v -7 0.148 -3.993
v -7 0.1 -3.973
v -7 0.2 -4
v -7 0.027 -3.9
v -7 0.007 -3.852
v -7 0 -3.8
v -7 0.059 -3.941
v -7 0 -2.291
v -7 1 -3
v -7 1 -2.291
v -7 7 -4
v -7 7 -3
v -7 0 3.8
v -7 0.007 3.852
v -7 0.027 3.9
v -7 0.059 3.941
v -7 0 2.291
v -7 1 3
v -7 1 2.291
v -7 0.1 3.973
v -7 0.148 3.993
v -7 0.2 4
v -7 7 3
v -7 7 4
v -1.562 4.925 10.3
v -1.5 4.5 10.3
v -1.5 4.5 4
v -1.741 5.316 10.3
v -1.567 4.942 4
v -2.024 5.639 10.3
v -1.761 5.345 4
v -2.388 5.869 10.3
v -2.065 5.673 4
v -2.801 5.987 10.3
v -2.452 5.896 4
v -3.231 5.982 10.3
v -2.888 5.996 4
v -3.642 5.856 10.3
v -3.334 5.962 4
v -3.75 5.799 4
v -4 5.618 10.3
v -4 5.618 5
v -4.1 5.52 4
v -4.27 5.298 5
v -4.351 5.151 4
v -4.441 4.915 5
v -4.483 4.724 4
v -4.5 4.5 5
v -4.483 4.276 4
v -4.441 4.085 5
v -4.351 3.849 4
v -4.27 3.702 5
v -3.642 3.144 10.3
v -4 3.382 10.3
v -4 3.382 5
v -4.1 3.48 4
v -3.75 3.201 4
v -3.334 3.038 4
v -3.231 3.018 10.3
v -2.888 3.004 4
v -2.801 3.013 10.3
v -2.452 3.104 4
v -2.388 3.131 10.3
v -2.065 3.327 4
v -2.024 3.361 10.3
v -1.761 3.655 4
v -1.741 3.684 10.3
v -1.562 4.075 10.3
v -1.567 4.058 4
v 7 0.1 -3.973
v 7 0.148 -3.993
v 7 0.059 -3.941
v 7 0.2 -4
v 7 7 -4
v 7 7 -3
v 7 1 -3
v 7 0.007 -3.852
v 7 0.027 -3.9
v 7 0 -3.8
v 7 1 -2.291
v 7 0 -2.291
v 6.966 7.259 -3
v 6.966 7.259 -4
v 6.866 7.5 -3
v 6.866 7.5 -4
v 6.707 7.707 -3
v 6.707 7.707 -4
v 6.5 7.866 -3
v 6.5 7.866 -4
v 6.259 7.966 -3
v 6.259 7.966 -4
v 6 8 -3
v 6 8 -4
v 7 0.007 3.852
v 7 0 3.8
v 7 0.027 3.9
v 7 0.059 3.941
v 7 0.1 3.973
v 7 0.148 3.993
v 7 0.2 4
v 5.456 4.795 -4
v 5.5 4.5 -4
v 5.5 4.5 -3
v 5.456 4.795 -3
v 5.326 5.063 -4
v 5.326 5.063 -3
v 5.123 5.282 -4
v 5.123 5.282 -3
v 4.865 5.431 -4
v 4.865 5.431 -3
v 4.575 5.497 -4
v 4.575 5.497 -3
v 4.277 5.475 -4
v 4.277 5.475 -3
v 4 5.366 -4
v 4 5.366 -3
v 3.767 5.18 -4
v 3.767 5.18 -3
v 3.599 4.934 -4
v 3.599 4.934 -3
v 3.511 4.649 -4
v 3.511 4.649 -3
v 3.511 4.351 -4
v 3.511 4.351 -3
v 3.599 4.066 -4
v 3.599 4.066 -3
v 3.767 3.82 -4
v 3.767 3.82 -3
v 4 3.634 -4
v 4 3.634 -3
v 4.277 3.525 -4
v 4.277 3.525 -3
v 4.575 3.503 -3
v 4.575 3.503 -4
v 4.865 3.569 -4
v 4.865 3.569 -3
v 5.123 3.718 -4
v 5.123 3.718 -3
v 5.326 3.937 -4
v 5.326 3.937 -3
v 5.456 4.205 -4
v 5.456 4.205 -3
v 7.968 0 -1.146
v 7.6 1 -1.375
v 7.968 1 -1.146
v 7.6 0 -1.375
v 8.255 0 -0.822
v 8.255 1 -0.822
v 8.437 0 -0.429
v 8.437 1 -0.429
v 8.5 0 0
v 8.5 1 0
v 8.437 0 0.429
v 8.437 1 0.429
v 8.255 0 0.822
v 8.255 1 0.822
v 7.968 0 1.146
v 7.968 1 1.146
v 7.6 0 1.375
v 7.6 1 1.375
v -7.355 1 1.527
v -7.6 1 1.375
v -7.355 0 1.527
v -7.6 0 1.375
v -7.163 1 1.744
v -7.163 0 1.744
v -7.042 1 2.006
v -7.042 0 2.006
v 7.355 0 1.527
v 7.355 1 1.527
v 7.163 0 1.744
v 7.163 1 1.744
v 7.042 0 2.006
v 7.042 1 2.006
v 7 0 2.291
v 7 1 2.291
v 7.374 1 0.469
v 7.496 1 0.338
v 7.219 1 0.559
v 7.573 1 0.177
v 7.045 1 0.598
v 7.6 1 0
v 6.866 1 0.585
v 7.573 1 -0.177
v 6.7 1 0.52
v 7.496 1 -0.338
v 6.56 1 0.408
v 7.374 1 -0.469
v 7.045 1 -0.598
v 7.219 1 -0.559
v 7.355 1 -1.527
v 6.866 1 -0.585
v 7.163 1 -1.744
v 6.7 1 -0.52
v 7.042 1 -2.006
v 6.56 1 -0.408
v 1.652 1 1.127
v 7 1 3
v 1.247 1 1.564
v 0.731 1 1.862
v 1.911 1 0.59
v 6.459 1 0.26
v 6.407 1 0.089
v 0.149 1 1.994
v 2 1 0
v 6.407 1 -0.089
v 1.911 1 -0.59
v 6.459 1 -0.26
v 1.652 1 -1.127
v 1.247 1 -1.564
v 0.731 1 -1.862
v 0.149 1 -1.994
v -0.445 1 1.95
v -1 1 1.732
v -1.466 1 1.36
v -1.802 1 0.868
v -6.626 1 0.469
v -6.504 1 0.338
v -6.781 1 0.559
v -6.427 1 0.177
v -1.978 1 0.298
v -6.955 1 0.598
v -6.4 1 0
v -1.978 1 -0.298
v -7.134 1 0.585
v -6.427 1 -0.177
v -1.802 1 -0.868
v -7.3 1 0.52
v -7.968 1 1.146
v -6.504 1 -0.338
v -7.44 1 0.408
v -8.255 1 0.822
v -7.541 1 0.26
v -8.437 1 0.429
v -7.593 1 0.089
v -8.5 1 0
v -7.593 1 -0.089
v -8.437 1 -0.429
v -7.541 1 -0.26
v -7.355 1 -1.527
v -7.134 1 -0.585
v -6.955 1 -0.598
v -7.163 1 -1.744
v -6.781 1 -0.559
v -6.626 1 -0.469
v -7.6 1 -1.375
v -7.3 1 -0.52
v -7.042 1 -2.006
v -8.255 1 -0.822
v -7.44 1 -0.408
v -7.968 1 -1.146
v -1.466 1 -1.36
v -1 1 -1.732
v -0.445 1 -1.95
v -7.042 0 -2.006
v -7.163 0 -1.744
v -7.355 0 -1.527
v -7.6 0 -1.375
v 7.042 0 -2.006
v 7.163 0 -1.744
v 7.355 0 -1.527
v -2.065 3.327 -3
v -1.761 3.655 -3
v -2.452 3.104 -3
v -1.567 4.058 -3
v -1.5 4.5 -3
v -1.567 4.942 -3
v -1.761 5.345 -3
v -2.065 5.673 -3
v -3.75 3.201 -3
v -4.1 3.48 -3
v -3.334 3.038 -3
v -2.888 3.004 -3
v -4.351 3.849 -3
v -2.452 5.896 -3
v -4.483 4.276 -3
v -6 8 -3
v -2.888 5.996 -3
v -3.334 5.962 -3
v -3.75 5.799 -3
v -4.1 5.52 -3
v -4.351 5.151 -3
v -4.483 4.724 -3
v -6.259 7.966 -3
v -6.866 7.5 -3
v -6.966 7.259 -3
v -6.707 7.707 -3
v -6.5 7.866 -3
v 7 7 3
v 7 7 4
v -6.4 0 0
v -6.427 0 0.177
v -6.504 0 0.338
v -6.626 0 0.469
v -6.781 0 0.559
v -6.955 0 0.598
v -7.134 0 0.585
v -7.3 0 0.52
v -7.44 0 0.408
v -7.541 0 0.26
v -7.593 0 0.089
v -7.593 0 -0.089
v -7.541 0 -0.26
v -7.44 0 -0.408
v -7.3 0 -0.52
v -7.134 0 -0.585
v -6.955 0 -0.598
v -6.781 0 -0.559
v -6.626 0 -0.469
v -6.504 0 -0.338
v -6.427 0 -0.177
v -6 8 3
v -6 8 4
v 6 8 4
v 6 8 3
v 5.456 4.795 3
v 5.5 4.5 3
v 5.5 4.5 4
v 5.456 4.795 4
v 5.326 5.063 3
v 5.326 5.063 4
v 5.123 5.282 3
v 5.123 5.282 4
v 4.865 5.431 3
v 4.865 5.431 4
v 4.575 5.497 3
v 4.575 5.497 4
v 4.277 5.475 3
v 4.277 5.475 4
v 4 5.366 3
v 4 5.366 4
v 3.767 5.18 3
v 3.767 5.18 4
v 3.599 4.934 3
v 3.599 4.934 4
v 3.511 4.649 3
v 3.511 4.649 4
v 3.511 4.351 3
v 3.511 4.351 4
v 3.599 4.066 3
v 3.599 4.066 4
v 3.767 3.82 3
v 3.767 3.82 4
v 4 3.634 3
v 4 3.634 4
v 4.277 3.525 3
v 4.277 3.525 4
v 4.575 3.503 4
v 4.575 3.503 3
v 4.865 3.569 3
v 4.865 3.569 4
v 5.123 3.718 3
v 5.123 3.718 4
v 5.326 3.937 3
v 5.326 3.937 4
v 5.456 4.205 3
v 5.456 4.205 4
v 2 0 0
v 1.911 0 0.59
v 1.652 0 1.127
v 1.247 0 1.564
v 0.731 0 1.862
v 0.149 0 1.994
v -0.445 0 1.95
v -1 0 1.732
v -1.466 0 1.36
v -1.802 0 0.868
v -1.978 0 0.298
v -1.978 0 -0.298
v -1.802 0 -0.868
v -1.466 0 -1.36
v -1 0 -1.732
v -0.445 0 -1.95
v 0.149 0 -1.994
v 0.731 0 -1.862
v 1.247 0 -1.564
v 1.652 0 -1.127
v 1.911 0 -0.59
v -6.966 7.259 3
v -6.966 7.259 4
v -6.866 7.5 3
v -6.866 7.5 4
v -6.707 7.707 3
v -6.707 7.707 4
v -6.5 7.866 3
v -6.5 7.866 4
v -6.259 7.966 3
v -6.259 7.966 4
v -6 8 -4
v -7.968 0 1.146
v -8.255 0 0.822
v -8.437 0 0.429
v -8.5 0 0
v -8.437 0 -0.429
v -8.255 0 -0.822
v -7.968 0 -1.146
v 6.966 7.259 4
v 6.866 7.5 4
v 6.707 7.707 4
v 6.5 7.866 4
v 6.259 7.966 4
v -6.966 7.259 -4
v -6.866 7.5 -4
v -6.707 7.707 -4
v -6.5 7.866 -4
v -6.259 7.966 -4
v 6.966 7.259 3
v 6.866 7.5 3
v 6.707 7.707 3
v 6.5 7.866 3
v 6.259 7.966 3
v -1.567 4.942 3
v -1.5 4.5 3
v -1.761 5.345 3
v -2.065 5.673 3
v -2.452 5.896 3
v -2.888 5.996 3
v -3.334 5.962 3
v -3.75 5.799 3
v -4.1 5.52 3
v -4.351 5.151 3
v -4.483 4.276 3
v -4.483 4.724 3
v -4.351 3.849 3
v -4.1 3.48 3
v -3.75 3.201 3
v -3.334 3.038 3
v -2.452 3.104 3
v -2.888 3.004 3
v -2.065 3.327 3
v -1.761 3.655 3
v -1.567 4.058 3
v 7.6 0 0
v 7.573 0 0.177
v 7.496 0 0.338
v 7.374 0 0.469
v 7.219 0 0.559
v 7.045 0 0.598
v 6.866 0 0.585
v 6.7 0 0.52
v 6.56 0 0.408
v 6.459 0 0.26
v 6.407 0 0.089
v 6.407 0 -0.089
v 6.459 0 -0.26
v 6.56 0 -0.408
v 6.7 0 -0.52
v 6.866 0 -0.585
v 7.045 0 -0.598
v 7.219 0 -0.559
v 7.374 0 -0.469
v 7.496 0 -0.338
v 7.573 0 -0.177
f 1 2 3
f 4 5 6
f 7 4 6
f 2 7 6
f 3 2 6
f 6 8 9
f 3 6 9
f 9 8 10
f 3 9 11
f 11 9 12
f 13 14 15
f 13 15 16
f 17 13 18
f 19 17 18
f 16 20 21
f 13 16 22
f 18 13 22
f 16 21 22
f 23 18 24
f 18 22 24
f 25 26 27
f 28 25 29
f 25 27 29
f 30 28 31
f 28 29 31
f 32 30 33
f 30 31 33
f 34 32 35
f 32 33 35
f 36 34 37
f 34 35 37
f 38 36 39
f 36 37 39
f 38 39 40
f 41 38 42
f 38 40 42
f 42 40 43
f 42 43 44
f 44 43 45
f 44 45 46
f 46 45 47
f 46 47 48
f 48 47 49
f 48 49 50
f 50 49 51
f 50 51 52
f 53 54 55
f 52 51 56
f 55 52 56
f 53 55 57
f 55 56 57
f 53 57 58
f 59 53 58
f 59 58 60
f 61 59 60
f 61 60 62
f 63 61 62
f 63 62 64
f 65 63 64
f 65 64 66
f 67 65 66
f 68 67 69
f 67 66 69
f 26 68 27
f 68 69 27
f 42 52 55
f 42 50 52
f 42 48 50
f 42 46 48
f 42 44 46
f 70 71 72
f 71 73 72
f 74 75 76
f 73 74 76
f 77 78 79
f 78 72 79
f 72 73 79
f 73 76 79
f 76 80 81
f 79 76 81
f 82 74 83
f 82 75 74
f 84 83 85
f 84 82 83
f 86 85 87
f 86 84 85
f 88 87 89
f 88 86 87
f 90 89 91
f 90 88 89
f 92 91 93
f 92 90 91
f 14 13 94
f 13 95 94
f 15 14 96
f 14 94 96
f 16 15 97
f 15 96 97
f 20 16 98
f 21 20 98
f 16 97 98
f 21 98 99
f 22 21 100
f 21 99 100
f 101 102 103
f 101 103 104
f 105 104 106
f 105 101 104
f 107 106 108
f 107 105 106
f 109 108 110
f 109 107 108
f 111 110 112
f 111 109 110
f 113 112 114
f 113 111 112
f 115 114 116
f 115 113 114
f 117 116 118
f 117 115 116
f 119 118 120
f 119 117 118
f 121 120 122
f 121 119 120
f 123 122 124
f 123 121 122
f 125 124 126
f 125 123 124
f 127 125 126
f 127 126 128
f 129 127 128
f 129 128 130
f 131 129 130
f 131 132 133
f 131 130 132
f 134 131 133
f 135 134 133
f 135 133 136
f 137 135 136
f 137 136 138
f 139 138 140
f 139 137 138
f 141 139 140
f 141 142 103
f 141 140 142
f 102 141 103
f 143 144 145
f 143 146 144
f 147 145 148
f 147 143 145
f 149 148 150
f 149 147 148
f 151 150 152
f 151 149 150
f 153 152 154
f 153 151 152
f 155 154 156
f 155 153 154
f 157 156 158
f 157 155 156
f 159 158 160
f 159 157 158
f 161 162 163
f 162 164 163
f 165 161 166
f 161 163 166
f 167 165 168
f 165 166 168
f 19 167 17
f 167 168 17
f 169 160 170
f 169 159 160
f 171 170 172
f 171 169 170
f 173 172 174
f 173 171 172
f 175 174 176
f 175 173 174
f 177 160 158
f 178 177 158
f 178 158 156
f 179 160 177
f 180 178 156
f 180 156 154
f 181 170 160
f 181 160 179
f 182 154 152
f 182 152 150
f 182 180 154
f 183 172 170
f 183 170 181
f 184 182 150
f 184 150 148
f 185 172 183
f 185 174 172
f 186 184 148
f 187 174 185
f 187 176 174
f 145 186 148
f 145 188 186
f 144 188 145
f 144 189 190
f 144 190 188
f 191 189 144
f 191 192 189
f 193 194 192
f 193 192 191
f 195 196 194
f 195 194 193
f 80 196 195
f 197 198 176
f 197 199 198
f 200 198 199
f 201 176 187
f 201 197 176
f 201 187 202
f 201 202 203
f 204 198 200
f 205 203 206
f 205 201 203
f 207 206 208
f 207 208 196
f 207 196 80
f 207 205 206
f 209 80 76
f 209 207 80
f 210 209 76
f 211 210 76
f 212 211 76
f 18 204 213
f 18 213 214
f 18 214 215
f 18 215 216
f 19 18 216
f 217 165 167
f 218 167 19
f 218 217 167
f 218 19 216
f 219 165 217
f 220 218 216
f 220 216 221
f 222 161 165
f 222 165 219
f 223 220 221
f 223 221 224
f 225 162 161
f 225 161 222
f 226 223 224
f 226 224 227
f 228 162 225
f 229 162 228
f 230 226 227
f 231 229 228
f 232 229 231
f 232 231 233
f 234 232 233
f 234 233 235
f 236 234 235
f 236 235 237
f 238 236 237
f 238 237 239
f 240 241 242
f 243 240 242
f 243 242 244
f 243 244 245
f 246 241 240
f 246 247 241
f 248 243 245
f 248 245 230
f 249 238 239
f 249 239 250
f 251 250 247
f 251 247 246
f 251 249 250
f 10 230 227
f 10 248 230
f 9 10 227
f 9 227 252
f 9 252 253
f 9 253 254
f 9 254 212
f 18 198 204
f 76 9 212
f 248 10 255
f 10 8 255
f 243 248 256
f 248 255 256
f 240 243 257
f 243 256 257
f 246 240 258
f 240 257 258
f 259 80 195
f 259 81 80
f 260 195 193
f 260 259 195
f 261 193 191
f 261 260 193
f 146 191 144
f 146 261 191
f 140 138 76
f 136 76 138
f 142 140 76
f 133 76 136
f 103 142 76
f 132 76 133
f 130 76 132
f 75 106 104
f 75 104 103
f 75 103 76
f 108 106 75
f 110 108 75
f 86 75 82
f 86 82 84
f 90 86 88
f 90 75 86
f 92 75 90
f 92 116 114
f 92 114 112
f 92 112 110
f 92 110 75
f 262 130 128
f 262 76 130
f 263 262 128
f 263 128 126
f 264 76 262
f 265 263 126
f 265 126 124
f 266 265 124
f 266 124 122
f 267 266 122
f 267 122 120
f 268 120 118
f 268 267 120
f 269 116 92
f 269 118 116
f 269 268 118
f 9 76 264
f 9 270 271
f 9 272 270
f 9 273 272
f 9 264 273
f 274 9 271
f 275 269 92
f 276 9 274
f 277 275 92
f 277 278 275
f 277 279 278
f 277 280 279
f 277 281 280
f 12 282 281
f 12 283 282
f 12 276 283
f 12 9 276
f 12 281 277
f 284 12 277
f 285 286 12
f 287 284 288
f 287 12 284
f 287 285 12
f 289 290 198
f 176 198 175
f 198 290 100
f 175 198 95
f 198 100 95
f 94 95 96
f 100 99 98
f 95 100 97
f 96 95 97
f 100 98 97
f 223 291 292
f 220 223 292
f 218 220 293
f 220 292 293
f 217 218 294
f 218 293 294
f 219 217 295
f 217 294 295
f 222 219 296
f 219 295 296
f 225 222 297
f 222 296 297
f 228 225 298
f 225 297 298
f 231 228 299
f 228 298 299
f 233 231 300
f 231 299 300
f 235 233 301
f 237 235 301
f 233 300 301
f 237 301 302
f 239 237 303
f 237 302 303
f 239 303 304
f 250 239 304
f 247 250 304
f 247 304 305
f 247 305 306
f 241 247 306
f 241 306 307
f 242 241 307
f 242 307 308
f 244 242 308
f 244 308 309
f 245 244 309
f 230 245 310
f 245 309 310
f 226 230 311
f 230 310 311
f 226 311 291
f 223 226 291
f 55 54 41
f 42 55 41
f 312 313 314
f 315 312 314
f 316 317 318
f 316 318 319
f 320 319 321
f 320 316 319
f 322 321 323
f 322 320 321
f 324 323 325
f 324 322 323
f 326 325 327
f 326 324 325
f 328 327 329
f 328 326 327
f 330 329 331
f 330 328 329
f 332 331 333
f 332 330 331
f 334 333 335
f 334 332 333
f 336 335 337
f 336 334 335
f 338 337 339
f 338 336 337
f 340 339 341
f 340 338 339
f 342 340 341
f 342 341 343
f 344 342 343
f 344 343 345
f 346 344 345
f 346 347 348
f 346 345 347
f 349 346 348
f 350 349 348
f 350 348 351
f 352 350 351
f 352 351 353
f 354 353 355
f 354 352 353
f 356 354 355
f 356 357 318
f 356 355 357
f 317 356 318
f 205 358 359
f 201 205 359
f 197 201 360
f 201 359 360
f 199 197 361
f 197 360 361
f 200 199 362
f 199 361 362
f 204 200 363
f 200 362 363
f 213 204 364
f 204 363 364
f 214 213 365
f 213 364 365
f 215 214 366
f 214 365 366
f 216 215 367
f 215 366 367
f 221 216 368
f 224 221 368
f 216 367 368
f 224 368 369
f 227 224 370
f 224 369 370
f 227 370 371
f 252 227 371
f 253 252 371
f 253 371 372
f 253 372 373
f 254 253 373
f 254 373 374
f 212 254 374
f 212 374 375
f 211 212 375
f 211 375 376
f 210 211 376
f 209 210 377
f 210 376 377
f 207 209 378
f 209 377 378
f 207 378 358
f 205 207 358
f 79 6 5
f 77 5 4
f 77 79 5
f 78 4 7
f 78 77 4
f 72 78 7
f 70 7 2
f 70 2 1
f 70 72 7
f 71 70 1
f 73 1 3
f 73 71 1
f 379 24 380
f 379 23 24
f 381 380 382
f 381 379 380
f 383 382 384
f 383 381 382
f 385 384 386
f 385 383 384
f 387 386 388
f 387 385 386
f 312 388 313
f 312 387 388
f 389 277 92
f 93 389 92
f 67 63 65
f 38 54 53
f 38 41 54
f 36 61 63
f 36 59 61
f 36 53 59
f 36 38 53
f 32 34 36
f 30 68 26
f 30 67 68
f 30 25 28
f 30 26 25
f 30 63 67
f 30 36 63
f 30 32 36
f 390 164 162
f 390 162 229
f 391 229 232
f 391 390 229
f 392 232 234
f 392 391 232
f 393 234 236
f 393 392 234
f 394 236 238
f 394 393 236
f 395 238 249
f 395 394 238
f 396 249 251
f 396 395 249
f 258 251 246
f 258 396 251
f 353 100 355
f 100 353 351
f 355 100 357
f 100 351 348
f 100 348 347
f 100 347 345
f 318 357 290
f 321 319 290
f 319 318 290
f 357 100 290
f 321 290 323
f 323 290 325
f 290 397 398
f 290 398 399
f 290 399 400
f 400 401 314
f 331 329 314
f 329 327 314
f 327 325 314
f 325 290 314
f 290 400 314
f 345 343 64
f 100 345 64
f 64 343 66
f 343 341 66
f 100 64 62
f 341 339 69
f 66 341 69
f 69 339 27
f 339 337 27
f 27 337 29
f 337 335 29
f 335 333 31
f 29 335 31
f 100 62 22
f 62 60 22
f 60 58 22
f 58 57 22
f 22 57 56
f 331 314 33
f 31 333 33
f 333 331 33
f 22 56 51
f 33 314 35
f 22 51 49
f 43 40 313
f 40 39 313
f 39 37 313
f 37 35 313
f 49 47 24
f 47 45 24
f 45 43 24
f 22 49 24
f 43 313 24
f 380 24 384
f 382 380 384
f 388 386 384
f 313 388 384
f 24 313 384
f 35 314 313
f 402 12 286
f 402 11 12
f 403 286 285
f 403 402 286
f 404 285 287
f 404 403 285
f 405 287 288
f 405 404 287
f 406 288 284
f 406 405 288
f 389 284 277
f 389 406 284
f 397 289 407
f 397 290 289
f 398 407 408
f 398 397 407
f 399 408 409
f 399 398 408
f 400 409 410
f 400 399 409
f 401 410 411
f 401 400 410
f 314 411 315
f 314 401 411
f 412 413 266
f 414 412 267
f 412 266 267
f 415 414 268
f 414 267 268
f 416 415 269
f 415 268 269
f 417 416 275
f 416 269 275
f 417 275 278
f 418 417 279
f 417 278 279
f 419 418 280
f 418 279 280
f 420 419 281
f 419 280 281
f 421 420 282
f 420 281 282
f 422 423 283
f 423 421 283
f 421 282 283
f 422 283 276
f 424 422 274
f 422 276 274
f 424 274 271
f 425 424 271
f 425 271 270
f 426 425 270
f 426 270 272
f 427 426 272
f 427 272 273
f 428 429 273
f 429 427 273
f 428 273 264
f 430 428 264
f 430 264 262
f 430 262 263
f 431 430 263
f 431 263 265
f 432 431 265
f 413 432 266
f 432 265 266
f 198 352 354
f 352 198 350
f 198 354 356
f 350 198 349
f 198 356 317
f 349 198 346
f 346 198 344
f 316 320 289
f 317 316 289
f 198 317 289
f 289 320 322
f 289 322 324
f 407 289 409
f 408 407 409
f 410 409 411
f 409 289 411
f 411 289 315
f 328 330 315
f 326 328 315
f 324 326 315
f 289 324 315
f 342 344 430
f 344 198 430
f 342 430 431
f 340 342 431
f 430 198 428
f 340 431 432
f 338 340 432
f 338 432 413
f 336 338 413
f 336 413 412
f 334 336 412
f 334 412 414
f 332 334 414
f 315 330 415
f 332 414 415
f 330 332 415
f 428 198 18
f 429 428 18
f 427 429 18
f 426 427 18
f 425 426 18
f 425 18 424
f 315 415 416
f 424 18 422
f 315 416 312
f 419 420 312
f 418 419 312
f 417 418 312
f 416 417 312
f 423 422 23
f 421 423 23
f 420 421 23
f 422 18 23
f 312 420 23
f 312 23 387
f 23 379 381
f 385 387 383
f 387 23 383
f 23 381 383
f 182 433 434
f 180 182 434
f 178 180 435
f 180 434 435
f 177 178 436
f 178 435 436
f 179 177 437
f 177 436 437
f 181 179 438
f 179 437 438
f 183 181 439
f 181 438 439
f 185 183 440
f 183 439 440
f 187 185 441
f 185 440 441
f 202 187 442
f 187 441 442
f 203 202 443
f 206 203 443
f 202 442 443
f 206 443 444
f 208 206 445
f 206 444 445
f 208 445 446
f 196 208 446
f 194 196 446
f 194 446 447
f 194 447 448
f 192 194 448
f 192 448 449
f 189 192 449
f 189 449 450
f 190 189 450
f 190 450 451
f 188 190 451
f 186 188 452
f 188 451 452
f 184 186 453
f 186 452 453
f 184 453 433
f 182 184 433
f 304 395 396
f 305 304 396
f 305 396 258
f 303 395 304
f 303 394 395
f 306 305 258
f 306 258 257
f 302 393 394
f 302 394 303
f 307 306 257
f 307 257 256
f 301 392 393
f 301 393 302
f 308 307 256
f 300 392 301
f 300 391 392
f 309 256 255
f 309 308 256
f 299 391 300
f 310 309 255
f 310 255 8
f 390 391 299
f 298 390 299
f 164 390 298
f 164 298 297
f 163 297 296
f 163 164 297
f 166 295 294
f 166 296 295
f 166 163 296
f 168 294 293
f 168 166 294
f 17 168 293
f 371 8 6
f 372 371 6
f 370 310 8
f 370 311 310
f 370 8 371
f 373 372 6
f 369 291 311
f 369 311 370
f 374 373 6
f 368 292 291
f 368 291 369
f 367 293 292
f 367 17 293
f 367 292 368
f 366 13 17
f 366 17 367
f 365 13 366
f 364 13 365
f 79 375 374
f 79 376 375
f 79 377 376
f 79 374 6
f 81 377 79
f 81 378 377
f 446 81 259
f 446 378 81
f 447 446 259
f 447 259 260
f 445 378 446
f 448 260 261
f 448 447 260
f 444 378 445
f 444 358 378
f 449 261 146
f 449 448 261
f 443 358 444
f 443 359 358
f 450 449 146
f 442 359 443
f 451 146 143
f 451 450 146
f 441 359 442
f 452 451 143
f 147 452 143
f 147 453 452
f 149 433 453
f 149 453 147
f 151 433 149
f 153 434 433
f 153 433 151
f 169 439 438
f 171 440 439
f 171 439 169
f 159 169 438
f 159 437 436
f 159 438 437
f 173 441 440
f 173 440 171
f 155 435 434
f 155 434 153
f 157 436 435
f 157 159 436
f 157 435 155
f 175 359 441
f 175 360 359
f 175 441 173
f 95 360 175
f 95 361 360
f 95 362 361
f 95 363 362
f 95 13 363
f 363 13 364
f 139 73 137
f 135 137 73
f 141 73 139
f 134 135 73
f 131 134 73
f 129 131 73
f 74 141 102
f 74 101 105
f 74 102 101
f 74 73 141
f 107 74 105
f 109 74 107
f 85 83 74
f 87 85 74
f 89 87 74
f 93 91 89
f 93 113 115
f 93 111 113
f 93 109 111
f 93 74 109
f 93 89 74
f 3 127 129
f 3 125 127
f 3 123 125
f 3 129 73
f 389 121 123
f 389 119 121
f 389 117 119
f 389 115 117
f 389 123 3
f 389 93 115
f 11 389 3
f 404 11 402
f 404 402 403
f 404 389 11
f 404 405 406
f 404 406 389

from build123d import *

# Parameters (mm, degrees)
EXTRUDE1_DEPTH      = 4
EXTRUDE2_DEPTH      = 12.357816692
EXTRUDE2_DEPTH_BACK = 12.357816692
SKETCH2_R           = 1
EXTRUDE3_DEPTH      = 12.357816692
EXTRUDE3_DEPTH_BACK = 12.357816692
SKETCH4_W           = 6
SKETCH4_H           = 8.732029078
FILLET1_R           = 0.2
FILLET2_R           = 1
EXTRUDE4_DEPTH      = 14
EXTRUDE4_DEPTH_BACK = 3
SKETCH3_R           = 1.5
EXTRUDE5_DEPTH      = 9
SKETCH6_R           = 1.5
EXTRUDE6_DEPTH      = 1
SKETCH7_R           = 0.6
EXTRUDE7_DEPTH      = 1
FILLET3_R           = 1
SKETCH8_R           = 2
EXTRUDE8_DEPTH      = 1
EXTRUDE9_START      = 6.3
SKETCH9_R           = 2.172550551
EXTRUDE9_DEPTH      = 10


with BuildPart() as part:
    # Sketch1 → Extrude1 (new, symmetric)
    with BuildSketch(Plane.XY):
        Polygon((0, 0), (-7, 0), (-7, 8), (7, 8), (7, 0), align=None)
    extrude(amount=EXTRUDE1_DEPTH, both=True)

    # Sketch2 → Extrude2 (cut, two sides: drawn at the far end of the back side and taken through both)
    with BuildSketch(Plane.XY.offset(-EXTRUDE2_DEPTH_BACK)):
        with Locations((4.5, 4.5)):
            Circle(SKETCH2_R)
    extrude(amount=EXTRUDE2_DEPTH + EXTRUDE2_DEPTH_BACK, mode=Mode.SUBTRACT)

    # Sketch4 → Extrude3 (cut, two sides: drawn at the far end of the back side and taken through both)
    with BuildSketch(Plane(origin=(0, 0, 0), x_dir=(0, 0, -1), z_dir=(1, 0, 0)).offset(-EXTRUDE3_DEPTH_BACK)):
        with Locations((0, 5.366014539)):
            Rectangle(SKETCH4_W, SKETCH4_H)
    extrude(amount=EXTRUDE3_DEPTH + EXTRUDE3_DEPTH_BACK, mode=Mode.SUBTRACT)

    # Fillet1
    fillet1_edges = [part.edges().sort_by_distance(p)[0] for p in [
        (0, 0, 4),
        (0, 0, -4),
    ]]
    fillet(fillet1_edges, radius=FILLET1_R)

    # Fillet2
    fillet2_edges = [part.edges().sort_by_distance(p)[0] for p in [
        (-7, 8, -3.5),
        (7, 8, -3.5),
        (-7, 8, 3.5),
        (7, 8, 3.5),
    ]]
    fillet(fillet2_edges, radius=FILLET2_R)

    # Sketch3 → Extrude4 (add, two sides: drawn at the far end of the back side and taken through both)
    with BuildSketch(Plane.XY.offset(-EXTRUDE4_DEPTH_BACK)):
        with Locations((-3, 4.5)):
            Circle(SKETCH3_R)
    extrude(amount=EXTRUDE4_DEPTH + EXTRUDE4_DEPTH_BACK)

    # Sketch5 → Extrude5 (cut)
    with BuildSketch(Plane.XY.offset(14)):
        Polygon((-4, 4.5), (-4, 6.060686456), (-4.95644391, 6.060686456), (-4.95644391, 2.5), (-4, 2.5), align=None)
    extrude(amount=-EXTRUDE5_DEPTH, mode=Mode.SUBTRACT)

    # Sketch6 → Extrude6 (add)
    with BuildSketch(Plane.XZ):
        with Locations((-7, 0)):
            Circle(SKETCH6_R)
        with Locations((7, 0)):
            Circle(SKETCH6_R)
    extrude(amount=-EXTRUDE6_DEPTH)

    # Sketch7 → Extrude7 (cut)
    with BuildSketch(Plane.XZ):
        with Locations((-7, 0)):
            Circle(SKETCH7_R)
        with Locations((7, 0)):
            Circle(SKETCH7_R)
    extrude(amount=-EXTRUDE7_DEPTH, mode=Mode.SUBTRACT)

    # Fillet3
    fillet3_edges = [part.edges().sort_by_distance(p)[0] for p in [
        (7, 0.5, -1.5),
        (7, 0.5, 1.5),
        (-7, 0.5, 1.5),
        (-7, 0.5, -1.5),
    ]]
    fillet(fillet3_edges, radius=FILLET3_R)

    # Sketch8 → Extrude8 (cut)
    with BuildSketch(Plane.XZ):
        Circle(SKETCH8_R)
    extrude(amount=-EXTRUDE8_DEPTH, mode=Mode.SUBTRACT)

    # Sketch9 → Extrude9 (cut)
    with BuildSketch(Plane.XY.offset(4).offset(EXTRUDE9_START)):
        with Locations((-3, 4.5)):
            Circle(SKETCH9_R)
    extrude(amount=EXTRUDE9_DEPTH, mode=Mode.SUBTRACT)


solid = part.part
